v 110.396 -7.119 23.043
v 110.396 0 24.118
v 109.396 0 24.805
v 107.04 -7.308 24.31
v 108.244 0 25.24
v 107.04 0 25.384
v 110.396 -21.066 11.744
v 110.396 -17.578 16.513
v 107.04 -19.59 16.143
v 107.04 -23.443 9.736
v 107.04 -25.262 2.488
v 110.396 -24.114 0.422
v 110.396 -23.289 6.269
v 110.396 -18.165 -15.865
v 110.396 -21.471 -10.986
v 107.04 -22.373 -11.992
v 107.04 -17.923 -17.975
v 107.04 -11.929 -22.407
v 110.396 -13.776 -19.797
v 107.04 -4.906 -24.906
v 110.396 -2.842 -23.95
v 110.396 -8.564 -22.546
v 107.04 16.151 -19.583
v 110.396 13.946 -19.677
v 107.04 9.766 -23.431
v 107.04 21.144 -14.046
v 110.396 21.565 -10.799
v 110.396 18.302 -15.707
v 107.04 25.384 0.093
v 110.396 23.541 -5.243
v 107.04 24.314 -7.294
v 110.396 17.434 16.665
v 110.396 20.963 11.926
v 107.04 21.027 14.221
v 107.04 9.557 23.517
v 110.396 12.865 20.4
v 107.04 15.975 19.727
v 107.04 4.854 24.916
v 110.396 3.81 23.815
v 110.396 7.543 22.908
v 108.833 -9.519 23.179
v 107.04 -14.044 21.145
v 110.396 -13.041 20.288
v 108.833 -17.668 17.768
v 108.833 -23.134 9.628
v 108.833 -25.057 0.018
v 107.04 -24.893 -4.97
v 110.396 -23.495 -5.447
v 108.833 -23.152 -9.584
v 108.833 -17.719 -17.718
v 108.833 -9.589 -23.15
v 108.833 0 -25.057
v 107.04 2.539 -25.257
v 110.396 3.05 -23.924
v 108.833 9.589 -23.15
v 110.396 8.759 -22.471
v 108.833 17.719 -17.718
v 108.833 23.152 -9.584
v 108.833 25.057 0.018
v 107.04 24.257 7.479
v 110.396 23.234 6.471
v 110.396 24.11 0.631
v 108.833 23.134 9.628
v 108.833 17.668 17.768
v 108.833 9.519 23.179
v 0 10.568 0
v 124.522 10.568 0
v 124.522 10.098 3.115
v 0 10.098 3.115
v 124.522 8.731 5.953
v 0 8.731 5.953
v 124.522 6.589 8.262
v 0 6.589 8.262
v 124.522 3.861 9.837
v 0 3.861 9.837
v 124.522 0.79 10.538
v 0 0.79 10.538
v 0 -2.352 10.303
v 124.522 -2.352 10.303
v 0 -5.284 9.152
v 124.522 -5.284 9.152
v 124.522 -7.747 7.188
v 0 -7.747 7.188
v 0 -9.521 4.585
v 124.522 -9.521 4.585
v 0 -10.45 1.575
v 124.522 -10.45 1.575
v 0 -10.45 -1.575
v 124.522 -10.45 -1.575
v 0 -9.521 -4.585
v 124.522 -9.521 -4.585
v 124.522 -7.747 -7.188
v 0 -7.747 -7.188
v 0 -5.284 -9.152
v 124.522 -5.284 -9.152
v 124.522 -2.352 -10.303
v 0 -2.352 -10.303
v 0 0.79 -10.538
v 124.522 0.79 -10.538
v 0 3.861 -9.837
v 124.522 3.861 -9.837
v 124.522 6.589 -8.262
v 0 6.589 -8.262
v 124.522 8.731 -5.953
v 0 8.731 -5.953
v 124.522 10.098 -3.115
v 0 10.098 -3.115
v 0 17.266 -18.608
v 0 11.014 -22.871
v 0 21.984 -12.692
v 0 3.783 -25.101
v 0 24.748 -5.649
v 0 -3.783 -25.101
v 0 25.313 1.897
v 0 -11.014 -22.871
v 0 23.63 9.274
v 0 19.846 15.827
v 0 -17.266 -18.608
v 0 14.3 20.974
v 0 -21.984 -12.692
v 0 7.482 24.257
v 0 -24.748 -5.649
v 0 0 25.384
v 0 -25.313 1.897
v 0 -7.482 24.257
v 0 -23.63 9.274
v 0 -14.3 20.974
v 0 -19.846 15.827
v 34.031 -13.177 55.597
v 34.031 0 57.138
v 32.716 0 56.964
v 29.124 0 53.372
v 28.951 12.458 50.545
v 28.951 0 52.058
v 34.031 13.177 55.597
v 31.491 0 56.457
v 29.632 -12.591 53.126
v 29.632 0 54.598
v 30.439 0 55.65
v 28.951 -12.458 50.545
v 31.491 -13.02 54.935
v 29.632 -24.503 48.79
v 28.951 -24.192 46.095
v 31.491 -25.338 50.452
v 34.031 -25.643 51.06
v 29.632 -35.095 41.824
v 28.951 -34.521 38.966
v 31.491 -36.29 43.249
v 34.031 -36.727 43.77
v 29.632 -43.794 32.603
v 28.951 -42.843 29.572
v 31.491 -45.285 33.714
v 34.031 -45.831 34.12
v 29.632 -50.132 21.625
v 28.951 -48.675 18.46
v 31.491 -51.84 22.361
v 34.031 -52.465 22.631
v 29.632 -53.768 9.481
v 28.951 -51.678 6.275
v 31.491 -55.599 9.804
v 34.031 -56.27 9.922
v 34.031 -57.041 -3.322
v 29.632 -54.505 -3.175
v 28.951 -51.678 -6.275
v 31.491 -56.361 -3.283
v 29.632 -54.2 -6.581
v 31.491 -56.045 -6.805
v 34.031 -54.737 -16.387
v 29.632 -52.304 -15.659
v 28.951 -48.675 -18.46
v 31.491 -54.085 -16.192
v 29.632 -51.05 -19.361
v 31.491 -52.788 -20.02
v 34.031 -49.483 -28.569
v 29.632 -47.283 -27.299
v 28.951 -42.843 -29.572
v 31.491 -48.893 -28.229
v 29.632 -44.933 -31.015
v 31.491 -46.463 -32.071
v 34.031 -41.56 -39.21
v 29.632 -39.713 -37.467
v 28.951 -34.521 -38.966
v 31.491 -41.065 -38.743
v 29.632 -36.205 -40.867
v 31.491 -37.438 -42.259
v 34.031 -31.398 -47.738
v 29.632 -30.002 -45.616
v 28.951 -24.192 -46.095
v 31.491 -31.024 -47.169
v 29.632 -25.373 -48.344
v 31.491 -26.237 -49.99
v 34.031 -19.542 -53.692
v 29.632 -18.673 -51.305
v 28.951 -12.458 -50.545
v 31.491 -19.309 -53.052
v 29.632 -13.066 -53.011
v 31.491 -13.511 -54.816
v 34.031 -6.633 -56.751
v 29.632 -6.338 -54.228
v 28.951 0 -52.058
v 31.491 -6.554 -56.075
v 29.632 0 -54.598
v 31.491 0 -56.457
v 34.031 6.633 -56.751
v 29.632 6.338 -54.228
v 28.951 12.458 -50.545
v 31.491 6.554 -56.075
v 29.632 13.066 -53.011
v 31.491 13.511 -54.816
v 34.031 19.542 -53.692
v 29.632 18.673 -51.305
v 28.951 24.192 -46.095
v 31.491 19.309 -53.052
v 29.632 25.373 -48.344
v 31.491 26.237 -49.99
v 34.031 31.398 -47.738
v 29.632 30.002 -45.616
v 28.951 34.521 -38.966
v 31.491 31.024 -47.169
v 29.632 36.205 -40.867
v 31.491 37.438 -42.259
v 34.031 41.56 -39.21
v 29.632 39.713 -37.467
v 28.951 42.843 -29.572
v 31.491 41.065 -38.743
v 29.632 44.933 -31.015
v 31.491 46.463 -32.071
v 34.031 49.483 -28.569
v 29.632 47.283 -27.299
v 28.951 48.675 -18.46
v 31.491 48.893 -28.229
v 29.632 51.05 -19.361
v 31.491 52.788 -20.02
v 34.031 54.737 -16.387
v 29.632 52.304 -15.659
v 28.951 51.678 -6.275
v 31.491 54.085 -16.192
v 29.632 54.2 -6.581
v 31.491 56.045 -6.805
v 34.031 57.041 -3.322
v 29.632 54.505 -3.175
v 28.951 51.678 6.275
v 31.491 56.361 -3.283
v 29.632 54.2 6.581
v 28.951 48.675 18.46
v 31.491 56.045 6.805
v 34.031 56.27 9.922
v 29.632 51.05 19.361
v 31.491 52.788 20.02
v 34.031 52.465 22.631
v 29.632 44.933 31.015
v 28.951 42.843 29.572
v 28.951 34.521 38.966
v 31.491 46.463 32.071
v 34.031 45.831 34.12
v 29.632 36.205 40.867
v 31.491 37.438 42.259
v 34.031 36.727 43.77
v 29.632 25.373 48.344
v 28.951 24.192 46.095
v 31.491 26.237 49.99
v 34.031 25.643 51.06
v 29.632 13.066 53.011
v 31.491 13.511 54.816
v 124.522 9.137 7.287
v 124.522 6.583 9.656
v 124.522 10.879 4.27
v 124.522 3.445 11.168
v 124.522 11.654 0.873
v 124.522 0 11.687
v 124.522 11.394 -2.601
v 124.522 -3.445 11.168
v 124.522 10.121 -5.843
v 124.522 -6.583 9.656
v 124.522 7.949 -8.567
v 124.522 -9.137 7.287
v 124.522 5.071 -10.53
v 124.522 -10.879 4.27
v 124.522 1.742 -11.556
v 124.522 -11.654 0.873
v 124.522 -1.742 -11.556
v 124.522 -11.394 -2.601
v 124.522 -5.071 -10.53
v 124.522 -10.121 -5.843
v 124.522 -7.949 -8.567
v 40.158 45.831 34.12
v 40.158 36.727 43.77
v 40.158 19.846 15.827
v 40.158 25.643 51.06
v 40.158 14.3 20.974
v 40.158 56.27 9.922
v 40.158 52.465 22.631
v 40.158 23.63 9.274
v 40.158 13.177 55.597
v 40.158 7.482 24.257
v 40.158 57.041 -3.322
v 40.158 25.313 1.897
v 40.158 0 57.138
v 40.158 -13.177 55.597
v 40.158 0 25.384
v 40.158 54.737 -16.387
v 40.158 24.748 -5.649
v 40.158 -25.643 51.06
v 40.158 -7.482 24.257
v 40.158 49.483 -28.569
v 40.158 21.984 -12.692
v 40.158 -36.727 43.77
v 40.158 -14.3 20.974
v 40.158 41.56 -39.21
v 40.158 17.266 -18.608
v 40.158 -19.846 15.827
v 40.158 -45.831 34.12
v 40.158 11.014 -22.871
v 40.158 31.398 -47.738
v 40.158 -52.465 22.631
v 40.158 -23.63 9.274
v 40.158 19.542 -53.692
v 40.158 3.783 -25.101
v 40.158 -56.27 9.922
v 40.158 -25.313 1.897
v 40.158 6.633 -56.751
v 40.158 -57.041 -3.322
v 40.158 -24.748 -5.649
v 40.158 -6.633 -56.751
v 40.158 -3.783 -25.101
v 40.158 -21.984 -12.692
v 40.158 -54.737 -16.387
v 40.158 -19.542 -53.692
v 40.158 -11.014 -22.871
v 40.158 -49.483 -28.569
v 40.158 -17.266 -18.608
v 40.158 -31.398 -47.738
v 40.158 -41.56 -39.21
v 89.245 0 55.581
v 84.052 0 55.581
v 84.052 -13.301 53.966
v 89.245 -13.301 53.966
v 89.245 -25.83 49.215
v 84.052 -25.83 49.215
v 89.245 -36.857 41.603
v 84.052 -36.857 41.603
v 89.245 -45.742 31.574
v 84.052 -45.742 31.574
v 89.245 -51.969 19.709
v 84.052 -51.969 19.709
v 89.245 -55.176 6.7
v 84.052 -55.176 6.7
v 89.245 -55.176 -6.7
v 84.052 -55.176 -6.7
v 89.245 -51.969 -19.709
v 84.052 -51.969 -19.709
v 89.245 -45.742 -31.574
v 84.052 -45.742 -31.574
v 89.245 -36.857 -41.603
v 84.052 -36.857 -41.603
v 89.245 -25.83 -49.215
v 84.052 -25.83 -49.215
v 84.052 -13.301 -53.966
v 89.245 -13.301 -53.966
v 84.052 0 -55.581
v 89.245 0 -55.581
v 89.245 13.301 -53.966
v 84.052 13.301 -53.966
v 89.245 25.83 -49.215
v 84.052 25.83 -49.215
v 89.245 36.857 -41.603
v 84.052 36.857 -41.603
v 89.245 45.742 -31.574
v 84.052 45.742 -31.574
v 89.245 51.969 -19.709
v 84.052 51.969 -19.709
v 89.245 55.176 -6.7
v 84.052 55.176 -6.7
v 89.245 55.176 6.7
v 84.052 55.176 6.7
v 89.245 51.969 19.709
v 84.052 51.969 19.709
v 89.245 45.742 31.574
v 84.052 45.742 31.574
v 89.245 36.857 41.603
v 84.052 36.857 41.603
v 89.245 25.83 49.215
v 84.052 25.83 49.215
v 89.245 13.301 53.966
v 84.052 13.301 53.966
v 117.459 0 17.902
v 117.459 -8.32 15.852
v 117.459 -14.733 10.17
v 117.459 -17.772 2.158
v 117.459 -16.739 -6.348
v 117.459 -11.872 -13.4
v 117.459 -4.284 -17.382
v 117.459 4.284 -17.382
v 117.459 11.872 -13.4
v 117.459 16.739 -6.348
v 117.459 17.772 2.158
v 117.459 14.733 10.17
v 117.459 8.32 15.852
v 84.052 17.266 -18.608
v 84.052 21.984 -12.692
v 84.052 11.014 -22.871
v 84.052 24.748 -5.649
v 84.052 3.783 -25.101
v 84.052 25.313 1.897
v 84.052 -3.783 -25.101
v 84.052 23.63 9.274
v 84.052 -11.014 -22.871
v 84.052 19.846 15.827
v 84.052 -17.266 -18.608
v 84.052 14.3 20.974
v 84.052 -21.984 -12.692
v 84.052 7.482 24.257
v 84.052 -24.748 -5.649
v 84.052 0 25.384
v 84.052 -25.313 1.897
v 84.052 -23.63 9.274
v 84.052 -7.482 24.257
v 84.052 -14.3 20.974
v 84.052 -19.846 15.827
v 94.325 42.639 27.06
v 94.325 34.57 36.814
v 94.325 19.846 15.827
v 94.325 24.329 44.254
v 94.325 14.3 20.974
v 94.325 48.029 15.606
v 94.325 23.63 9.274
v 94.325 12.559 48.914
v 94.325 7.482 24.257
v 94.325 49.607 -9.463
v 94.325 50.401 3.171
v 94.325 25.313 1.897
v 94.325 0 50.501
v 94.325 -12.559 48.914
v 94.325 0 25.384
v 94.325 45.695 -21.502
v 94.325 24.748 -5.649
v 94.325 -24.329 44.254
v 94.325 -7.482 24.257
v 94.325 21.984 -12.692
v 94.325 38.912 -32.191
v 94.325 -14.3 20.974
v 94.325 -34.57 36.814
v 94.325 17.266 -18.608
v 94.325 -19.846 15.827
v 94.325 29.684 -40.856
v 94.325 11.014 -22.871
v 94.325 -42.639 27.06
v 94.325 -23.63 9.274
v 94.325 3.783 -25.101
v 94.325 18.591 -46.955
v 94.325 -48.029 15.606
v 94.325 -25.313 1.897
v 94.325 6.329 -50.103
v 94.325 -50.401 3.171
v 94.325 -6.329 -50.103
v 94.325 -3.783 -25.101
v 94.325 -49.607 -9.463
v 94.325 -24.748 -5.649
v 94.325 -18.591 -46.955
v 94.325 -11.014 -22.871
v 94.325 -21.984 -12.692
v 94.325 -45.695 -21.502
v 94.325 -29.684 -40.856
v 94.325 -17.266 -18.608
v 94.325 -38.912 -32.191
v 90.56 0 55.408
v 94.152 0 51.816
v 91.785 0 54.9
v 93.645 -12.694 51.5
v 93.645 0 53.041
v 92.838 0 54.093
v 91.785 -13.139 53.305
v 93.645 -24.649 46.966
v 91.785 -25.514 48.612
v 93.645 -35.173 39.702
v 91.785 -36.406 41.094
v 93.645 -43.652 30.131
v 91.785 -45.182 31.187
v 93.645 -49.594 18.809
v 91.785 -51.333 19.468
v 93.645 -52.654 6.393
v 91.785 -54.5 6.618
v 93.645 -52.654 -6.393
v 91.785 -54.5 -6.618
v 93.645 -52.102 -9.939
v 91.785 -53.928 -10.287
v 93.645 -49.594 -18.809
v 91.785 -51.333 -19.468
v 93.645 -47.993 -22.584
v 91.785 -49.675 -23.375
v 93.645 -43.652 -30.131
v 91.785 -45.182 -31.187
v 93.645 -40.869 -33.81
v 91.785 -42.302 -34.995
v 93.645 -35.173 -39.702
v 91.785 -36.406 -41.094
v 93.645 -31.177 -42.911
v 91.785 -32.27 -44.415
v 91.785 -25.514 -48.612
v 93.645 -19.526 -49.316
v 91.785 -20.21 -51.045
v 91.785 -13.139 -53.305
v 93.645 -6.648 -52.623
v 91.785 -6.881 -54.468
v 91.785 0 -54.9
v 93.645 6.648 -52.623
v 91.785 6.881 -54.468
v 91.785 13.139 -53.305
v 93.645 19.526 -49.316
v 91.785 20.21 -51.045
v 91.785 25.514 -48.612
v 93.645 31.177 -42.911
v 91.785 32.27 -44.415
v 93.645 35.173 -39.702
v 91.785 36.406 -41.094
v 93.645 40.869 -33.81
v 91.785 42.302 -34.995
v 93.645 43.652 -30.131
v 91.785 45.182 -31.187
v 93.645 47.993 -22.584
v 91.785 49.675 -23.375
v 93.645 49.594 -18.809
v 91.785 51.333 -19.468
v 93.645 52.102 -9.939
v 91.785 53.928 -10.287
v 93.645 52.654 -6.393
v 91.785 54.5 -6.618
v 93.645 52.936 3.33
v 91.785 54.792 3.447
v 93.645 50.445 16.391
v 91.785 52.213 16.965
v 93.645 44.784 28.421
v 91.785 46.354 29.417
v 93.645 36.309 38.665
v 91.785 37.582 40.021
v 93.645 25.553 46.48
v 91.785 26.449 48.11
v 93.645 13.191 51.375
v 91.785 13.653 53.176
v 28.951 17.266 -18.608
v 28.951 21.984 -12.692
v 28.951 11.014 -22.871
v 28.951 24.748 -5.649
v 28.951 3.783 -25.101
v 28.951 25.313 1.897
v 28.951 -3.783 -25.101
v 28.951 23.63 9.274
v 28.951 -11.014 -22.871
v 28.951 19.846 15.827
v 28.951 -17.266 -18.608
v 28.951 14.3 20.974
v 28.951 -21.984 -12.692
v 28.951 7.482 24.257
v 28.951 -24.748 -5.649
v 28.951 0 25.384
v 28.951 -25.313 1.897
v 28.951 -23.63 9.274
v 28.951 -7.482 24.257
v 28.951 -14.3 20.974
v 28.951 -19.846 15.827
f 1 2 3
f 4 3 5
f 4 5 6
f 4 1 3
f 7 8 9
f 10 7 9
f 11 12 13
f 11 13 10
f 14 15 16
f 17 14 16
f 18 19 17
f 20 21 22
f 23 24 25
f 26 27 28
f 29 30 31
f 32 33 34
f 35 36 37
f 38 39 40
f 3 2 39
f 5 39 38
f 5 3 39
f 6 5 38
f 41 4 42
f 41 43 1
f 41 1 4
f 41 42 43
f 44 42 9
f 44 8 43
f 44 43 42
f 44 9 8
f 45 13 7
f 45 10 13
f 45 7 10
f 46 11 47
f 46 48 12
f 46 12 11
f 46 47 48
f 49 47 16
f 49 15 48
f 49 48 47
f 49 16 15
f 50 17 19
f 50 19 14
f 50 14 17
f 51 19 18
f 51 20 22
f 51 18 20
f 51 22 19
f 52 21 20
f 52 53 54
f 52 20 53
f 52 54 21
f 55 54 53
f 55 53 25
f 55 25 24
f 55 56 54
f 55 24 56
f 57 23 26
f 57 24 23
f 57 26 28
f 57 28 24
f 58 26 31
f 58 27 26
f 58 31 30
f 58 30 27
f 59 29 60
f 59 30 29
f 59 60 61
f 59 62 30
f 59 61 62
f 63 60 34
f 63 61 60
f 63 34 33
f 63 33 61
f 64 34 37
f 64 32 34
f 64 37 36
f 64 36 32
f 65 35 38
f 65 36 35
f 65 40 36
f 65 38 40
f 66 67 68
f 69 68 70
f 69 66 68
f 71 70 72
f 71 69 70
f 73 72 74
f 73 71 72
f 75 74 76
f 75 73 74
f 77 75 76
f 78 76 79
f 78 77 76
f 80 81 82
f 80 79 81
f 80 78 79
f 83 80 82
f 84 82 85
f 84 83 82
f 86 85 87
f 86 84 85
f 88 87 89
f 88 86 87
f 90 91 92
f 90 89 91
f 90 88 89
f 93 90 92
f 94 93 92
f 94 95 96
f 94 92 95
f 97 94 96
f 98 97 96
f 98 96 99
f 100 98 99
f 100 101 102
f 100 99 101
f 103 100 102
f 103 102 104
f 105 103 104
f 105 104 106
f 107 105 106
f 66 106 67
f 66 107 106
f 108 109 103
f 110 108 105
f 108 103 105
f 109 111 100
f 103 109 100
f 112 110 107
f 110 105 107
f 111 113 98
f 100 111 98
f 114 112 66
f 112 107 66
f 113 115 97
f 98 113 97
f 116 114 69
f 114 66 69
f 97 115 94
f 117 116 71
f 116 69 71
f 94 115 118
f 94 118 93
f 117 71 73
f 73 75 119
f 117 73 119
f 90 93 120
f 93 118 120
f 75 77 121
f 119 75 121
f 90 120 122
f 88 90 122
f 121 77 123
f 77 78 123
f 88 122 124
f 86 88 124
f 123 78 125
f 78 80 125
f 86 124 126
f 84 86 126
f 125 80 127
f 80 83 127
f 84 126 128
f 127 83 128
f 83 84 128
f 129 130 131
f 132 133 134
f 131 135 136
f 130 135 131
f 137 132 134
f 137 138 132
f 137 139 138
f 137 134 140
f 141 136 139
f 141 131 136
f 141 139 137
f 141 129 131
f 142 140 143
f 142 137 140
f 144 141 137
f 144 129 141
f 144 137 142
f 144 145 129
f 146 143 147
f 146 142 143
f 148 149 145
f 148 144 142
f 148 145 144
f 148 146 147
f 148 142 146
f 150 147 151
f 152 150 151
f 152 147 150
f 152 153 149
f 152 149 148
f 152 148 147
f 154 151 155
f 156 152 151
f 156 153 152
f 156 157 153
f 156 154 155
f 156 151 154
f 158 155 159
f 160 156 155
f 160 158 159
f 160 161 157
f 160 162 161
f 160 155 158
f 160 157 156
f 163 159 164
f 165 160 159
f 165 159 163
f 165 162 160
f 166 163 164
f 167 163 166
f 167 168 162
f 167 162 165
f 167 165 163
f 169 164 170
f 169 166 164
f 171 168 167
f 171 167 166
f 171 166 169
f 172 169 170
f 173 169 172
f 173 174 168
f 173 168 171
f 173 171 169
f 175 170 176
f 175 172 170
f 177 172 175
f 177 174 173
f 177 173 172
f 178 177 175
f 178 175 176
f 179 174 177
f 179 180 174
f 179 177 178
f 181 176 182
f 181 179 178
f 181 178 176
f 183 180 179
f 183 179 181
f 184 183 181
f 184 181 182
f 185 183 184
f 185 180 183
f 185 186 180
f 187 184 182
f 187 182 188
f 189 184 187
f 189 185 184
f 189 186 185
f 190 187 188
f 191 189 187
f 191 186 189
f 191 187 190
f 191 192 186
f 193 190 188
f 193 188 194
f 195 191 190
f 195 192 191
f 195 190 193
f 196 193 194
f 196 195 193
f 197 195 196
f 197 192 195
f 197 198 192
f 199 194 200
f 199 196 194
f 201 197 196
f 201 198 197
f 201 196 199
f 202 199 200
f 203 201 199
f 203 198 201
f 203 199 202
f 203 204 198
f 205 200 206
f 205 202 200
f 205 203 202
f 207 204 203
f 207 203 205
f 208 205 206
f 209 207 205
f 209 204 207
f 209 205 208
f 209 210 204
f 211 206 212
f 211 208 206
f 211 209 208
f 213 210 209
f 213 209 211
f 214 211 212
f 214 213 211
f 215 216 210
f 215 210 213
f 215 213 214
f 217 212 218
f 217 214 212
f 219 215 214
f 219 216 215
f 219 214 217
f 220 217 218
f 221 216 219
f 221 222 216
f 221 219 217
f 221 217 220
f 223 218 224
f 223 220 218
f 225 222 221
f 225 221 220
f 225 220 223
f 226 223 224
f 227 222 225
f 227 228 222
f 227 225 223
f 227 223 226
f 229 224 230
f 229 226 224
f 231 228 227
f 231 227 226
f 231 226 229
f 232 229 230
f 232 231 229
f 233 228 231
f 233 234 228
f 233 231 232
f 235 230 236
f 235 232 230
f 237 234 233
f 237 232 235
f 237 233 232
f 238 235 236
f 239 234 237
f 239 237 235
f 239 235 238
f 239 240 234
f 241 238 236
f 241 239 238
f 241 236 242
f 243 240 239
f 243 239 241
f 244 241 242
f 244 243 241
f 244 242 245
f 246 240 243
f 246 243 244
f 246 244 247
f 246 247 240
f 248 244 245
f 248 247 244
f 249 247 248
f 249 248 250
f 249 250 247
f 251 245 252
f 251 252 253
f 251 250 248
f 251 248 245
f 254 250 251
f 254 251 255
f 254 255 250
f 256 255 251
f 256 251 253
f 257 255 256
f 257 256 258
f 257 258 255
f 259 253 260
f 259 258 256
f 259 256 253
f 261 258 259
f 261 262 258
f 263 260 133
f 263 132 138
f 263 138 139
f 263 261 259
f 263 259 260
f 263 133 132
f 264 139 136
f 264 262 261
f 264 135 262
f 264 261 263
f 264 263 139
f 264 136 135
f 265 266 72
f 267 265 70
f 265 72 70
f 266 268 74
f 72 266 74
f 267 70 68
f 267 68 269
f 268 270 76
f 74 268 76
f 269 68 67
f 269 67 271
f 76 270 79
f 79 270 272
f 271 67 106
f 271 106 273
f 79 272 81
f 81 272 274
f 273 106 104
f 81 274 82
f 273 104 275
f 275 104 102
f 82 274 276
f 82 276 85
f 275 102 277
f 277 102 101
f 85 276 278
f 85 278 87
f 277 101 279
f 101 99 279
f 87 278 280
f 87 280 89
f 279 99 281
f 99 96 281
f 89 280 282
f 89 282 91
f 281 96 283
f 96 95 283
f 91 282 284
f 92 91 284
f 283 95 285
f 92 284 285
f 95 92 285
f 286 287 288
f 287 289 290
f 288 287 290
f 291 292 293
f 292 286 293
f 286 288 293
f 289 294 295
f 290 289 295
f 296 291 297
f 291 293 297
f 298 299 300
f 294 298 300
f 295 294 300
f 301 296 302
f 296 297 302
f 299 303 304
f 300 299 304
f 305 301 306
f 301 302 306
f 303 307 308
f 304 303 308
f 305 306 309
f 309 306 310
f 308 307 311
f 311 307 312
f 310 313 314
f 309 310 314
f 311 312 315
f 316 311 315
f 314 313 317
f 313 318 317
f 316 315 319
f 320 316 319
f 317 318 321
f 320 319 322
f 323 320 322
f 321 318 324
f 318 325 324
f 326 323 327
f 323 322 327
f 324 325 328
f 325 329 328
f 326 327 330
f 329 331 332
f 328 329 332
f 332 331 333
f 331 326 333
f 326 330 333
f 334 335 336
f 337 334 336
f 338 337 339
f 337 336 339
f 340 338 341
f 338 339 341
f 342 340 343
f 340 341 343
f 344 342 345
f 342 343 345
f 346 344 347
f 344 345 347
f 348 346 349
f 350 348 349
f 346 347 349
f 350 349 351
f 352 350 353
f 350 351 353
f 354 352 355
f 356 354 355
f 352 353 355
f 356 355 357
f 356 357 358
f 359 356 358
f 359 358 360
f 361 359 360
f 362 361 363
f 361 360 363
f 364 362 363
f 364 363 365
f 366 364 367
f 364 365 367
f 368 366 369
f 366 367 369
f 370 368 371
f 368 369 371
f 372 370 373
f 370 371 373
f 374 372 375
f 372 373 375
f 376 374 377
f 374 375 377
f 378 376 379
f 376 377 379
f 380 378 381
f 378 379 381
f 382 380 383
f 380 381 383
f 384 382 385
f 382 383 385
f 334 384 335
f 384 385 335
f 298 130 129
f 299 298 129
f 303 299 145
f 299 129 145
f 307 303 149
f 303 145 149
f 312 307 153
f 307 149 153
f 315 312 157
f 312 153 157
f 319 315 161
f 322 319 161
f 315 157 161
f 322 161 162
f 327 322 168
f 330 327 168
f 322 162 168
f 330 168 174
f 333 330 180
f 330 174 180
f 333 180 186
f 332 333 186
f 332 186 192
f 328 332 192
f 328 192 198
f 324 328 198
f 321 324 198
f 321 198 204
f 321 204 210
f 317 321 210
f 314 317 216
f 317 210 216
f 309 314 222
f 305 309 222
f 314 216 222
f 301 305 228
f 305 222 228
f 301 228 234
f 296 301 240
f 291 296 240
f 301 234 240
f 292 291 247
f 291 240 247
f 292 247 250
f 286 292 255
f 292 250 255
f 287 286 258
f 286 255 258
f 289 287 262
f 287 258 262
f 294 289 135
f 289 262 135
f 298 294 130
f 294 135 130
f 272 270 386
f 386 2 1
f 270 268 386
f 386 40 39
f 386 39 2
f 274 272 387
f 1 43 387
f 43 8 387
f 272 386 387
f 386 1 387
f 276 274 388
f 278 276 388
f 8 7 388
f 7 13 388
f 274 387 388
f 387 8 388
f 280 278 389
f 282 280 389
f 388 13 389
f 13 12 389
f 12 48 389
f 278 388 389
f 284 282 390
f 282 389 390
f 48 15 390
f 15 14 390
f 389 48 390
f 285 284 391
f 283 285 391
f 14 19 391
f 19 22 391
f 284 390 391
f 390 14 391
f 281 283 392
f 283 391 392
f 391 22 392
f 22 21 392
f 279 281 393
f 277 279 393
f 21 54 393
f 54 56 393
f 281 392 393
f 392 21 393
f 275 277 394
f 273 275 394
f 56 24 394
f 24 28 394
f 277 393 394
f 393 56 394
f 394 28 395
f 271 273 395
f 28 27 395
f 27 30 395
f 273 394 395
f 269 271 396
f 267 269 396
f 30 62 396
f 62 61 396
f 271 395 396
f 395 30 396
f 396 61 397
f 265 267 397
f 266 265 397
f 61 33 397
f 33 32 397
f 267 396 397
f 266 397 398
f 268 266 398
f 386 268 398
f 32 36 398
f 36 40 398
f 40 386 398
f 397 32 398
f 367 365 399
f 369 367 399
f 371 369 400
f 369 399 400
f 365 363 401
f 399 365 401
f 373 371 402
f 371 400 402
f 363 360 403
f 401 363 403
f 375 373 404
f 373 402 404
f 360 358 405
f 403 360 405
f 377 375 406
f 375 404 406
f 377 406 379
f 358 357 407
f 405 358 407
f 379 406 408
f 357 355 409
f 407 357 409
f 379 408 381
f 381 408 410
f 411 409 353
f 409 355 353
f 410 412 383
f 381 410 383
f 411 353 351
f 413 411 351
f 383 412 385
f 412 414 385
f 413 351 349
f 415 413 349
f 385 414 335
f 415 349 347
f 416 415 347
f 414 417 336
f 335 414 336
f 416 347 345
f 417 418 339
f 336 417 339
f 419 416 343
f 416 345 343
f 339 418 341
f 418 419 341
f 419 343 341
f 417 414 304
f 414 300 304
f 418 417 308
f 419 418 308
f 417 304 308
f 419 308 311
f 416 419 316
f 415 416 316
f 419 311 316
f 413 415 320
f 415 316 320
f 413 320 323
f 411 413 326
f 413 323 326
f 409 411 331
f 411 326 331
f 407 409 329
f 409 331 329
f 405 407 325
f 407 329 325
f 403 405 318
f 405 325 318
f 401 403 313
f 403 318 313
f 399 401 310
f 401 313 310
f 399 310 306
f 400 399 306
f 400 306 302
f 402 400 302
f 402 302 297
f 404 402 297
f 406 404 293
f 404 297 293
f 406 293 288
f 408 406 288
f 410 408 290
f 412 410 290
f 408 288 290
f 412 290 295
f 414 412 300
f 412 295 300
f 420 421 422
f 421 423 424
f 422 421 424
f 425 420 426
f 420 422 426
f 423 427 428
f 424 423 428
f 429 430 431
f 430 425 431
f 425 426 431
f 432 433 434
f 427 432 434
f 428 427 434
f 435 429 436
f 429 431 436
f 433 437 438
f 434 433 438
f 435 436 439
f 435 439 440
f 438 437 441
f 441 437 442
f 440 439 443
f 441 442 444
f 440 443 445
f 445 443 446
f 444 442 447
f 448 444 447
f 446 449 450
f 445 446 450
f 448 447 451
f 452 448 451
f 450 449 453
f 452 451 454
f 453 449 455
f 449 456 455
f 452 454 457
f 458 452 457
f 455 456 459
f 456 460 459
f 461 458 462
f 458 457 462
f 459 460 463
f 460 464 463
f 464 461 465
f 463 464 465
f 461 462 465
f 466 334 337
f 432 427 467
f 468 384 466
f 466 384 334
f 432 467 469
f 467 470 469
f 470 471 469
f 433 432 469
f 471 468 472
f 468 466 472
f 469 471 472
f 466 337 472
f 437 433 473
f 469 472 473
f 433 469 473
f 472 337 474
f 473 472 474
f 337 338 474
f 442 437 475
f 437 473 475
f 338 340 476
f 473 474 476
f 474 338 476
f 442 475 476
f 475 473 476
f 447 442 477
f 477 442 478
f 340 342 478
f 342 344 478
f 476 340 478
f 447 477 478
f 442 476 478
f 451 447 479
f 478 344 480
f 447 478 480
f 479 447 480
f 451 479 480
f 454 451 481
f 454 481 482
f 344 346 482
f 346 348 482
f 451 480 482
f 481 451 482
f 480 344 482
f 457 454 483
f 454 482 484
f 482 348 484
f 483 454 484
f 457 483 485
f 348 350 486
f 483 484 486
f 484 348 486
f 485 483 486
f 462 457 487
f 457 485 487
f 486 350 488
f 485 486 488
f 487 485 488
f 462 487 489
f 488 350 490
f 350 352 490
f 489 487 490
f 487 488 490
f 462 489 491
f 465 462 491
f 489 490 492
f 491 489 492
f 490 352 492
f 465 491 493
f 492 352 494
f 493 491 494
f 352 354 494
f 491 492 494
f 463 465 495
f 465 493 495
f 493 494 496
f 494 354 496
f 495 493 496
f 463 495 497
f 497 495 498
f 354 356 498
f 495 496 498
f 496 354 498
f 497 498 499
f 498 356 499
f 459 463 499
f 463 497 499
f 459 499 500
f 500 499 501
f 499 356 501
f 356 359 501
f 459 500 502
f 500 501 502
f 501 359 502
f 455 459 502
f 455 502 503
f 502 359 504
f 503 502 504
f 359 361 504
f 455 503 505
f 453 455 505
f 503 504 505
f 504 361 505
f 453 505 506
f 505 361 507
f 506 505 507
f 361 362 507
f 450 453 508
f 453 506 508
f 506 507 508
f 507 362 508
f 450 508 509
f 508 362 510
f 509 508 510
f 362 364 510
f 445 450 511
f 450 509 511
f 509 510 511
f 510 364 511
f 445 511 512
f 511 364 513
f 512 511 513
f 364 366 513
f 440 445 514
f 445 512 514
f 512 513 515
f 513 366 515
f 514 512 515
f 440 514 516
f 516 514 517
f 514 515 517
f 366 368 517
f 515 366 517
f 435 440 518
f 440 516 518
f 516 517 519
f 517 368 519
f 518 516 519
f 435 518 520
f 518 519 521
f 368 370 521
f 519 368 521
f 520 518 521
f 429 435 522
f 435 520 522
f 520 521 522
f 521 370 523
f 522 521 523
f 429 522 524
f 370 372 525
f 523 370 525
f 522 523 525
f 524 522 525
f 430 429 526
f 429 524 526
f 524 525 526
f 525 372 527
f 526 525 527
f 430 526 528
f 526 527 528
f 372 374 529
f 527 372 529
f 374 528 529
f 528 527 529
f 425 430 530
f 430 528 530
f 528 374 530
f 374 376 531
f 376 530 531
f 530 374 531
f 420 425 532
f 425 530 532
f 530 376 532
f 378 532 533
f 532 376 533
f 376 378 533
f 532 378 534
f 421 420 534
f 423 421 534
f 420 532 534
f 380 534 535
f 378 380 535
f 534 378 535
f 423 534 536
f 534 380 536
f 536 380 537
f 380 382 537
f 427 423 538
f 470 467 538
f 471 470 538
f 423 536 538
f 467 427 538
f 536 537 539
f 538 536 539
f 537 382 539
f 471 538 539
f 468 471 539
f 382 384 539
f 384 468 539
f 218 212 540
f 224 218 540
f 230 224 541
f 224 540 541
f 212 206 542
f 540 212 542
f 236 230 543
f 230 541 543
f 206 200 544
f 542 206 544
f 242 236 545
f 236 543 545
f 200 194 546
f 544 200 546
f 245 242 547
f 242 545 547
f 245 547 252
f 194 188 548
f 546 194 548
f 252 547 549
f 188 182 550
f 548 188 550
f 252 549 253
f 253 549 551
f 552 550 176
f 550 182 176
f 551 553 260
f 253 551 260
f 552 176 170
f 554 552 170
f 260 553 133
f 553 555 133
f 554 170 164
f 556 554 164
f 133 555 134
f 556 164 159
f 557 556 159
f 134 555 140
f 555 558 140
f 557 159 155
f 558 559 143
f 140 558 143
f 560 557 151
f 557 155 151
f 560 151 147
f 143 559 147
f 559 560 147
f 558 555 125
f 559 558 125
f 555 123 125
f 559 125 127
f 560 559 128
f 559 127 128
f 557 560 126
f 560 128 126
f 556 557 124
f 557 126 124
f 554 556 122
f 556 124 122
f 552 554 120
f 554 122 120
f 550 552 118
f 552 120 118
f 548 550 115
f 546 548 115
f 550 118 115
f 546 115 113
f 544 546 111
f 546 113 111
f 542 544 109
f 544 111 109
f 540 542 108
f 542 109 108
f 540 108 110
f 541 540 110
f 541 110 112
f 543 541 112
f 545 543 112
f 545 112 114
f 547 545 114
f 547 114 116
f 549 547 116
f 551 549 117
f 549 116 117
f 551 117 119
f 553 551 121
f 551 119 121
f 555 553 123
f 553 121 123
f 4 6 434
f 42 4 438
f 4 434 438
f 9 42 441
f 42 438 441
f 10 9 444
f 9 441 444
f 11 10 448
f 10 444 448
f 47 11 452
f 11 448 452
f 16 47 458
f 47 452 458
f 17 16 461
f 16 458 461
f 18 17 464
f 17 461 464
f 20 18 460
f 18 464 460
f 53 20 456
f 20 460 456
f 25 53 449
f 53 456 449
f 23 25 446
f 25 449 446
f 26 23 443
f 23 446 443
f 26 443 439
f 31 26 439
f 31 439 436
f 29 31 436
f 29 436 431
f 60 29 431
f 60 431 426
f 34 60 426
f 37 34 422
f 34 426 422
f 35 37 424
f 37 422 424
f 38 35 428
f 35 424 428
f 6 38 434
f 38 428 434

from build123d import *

# Parameters (mm, degrees)
F2_R     = 10.5676667099
F3_DEPTH = 124.5231421123
F4_R     = 5.08


# Not quite as in the source:
# - a feature names something its author has since deleted; it is built from what else it names


with BuildPart() as f1:
    # F0 (on Front) → F1 (revolve)
    with BuildSketch(Plane.XZ):
        Polygon((0, 25.3843758255), (0, 0), (124.5221421123, 0), (124.5221421123, 11.6869108751), (108.956836164, 25.3843758255), (94.325453043, 25.3843758255), (94.325453043, 55.5810630322), (84.0523540974, 55.5810630322), (84.0523540974, 25.3843758255), (40.1582047343, 25.3843758255), (40.1582047343, 57.137593627), (28.951190412, 57.137593627), (28.951190412, 25.3843758255), align=None)
    revolve(axis=Axis((62.2610710561, 0, 0), (1, 0, 0)))

    # F2 (on Right) → F3 (cut, through all)
    with BuildSketch(Plane.YZ):
        Circle(F2_R)
    extrude(amount=F3_DEPTH, mode=Mode.SUBTRACT)

    # F4
    f4_edges = [f1.edges().sort_by_distance(p)[0] for p in [
        (108.956836, 0, -25.384376),
        (94.325453, 0, -55.581063),
        (28.95119, 0, -57.137594),
    ]]
    fillet(f4_edges, radius=F4_R)


solid = f1.part
